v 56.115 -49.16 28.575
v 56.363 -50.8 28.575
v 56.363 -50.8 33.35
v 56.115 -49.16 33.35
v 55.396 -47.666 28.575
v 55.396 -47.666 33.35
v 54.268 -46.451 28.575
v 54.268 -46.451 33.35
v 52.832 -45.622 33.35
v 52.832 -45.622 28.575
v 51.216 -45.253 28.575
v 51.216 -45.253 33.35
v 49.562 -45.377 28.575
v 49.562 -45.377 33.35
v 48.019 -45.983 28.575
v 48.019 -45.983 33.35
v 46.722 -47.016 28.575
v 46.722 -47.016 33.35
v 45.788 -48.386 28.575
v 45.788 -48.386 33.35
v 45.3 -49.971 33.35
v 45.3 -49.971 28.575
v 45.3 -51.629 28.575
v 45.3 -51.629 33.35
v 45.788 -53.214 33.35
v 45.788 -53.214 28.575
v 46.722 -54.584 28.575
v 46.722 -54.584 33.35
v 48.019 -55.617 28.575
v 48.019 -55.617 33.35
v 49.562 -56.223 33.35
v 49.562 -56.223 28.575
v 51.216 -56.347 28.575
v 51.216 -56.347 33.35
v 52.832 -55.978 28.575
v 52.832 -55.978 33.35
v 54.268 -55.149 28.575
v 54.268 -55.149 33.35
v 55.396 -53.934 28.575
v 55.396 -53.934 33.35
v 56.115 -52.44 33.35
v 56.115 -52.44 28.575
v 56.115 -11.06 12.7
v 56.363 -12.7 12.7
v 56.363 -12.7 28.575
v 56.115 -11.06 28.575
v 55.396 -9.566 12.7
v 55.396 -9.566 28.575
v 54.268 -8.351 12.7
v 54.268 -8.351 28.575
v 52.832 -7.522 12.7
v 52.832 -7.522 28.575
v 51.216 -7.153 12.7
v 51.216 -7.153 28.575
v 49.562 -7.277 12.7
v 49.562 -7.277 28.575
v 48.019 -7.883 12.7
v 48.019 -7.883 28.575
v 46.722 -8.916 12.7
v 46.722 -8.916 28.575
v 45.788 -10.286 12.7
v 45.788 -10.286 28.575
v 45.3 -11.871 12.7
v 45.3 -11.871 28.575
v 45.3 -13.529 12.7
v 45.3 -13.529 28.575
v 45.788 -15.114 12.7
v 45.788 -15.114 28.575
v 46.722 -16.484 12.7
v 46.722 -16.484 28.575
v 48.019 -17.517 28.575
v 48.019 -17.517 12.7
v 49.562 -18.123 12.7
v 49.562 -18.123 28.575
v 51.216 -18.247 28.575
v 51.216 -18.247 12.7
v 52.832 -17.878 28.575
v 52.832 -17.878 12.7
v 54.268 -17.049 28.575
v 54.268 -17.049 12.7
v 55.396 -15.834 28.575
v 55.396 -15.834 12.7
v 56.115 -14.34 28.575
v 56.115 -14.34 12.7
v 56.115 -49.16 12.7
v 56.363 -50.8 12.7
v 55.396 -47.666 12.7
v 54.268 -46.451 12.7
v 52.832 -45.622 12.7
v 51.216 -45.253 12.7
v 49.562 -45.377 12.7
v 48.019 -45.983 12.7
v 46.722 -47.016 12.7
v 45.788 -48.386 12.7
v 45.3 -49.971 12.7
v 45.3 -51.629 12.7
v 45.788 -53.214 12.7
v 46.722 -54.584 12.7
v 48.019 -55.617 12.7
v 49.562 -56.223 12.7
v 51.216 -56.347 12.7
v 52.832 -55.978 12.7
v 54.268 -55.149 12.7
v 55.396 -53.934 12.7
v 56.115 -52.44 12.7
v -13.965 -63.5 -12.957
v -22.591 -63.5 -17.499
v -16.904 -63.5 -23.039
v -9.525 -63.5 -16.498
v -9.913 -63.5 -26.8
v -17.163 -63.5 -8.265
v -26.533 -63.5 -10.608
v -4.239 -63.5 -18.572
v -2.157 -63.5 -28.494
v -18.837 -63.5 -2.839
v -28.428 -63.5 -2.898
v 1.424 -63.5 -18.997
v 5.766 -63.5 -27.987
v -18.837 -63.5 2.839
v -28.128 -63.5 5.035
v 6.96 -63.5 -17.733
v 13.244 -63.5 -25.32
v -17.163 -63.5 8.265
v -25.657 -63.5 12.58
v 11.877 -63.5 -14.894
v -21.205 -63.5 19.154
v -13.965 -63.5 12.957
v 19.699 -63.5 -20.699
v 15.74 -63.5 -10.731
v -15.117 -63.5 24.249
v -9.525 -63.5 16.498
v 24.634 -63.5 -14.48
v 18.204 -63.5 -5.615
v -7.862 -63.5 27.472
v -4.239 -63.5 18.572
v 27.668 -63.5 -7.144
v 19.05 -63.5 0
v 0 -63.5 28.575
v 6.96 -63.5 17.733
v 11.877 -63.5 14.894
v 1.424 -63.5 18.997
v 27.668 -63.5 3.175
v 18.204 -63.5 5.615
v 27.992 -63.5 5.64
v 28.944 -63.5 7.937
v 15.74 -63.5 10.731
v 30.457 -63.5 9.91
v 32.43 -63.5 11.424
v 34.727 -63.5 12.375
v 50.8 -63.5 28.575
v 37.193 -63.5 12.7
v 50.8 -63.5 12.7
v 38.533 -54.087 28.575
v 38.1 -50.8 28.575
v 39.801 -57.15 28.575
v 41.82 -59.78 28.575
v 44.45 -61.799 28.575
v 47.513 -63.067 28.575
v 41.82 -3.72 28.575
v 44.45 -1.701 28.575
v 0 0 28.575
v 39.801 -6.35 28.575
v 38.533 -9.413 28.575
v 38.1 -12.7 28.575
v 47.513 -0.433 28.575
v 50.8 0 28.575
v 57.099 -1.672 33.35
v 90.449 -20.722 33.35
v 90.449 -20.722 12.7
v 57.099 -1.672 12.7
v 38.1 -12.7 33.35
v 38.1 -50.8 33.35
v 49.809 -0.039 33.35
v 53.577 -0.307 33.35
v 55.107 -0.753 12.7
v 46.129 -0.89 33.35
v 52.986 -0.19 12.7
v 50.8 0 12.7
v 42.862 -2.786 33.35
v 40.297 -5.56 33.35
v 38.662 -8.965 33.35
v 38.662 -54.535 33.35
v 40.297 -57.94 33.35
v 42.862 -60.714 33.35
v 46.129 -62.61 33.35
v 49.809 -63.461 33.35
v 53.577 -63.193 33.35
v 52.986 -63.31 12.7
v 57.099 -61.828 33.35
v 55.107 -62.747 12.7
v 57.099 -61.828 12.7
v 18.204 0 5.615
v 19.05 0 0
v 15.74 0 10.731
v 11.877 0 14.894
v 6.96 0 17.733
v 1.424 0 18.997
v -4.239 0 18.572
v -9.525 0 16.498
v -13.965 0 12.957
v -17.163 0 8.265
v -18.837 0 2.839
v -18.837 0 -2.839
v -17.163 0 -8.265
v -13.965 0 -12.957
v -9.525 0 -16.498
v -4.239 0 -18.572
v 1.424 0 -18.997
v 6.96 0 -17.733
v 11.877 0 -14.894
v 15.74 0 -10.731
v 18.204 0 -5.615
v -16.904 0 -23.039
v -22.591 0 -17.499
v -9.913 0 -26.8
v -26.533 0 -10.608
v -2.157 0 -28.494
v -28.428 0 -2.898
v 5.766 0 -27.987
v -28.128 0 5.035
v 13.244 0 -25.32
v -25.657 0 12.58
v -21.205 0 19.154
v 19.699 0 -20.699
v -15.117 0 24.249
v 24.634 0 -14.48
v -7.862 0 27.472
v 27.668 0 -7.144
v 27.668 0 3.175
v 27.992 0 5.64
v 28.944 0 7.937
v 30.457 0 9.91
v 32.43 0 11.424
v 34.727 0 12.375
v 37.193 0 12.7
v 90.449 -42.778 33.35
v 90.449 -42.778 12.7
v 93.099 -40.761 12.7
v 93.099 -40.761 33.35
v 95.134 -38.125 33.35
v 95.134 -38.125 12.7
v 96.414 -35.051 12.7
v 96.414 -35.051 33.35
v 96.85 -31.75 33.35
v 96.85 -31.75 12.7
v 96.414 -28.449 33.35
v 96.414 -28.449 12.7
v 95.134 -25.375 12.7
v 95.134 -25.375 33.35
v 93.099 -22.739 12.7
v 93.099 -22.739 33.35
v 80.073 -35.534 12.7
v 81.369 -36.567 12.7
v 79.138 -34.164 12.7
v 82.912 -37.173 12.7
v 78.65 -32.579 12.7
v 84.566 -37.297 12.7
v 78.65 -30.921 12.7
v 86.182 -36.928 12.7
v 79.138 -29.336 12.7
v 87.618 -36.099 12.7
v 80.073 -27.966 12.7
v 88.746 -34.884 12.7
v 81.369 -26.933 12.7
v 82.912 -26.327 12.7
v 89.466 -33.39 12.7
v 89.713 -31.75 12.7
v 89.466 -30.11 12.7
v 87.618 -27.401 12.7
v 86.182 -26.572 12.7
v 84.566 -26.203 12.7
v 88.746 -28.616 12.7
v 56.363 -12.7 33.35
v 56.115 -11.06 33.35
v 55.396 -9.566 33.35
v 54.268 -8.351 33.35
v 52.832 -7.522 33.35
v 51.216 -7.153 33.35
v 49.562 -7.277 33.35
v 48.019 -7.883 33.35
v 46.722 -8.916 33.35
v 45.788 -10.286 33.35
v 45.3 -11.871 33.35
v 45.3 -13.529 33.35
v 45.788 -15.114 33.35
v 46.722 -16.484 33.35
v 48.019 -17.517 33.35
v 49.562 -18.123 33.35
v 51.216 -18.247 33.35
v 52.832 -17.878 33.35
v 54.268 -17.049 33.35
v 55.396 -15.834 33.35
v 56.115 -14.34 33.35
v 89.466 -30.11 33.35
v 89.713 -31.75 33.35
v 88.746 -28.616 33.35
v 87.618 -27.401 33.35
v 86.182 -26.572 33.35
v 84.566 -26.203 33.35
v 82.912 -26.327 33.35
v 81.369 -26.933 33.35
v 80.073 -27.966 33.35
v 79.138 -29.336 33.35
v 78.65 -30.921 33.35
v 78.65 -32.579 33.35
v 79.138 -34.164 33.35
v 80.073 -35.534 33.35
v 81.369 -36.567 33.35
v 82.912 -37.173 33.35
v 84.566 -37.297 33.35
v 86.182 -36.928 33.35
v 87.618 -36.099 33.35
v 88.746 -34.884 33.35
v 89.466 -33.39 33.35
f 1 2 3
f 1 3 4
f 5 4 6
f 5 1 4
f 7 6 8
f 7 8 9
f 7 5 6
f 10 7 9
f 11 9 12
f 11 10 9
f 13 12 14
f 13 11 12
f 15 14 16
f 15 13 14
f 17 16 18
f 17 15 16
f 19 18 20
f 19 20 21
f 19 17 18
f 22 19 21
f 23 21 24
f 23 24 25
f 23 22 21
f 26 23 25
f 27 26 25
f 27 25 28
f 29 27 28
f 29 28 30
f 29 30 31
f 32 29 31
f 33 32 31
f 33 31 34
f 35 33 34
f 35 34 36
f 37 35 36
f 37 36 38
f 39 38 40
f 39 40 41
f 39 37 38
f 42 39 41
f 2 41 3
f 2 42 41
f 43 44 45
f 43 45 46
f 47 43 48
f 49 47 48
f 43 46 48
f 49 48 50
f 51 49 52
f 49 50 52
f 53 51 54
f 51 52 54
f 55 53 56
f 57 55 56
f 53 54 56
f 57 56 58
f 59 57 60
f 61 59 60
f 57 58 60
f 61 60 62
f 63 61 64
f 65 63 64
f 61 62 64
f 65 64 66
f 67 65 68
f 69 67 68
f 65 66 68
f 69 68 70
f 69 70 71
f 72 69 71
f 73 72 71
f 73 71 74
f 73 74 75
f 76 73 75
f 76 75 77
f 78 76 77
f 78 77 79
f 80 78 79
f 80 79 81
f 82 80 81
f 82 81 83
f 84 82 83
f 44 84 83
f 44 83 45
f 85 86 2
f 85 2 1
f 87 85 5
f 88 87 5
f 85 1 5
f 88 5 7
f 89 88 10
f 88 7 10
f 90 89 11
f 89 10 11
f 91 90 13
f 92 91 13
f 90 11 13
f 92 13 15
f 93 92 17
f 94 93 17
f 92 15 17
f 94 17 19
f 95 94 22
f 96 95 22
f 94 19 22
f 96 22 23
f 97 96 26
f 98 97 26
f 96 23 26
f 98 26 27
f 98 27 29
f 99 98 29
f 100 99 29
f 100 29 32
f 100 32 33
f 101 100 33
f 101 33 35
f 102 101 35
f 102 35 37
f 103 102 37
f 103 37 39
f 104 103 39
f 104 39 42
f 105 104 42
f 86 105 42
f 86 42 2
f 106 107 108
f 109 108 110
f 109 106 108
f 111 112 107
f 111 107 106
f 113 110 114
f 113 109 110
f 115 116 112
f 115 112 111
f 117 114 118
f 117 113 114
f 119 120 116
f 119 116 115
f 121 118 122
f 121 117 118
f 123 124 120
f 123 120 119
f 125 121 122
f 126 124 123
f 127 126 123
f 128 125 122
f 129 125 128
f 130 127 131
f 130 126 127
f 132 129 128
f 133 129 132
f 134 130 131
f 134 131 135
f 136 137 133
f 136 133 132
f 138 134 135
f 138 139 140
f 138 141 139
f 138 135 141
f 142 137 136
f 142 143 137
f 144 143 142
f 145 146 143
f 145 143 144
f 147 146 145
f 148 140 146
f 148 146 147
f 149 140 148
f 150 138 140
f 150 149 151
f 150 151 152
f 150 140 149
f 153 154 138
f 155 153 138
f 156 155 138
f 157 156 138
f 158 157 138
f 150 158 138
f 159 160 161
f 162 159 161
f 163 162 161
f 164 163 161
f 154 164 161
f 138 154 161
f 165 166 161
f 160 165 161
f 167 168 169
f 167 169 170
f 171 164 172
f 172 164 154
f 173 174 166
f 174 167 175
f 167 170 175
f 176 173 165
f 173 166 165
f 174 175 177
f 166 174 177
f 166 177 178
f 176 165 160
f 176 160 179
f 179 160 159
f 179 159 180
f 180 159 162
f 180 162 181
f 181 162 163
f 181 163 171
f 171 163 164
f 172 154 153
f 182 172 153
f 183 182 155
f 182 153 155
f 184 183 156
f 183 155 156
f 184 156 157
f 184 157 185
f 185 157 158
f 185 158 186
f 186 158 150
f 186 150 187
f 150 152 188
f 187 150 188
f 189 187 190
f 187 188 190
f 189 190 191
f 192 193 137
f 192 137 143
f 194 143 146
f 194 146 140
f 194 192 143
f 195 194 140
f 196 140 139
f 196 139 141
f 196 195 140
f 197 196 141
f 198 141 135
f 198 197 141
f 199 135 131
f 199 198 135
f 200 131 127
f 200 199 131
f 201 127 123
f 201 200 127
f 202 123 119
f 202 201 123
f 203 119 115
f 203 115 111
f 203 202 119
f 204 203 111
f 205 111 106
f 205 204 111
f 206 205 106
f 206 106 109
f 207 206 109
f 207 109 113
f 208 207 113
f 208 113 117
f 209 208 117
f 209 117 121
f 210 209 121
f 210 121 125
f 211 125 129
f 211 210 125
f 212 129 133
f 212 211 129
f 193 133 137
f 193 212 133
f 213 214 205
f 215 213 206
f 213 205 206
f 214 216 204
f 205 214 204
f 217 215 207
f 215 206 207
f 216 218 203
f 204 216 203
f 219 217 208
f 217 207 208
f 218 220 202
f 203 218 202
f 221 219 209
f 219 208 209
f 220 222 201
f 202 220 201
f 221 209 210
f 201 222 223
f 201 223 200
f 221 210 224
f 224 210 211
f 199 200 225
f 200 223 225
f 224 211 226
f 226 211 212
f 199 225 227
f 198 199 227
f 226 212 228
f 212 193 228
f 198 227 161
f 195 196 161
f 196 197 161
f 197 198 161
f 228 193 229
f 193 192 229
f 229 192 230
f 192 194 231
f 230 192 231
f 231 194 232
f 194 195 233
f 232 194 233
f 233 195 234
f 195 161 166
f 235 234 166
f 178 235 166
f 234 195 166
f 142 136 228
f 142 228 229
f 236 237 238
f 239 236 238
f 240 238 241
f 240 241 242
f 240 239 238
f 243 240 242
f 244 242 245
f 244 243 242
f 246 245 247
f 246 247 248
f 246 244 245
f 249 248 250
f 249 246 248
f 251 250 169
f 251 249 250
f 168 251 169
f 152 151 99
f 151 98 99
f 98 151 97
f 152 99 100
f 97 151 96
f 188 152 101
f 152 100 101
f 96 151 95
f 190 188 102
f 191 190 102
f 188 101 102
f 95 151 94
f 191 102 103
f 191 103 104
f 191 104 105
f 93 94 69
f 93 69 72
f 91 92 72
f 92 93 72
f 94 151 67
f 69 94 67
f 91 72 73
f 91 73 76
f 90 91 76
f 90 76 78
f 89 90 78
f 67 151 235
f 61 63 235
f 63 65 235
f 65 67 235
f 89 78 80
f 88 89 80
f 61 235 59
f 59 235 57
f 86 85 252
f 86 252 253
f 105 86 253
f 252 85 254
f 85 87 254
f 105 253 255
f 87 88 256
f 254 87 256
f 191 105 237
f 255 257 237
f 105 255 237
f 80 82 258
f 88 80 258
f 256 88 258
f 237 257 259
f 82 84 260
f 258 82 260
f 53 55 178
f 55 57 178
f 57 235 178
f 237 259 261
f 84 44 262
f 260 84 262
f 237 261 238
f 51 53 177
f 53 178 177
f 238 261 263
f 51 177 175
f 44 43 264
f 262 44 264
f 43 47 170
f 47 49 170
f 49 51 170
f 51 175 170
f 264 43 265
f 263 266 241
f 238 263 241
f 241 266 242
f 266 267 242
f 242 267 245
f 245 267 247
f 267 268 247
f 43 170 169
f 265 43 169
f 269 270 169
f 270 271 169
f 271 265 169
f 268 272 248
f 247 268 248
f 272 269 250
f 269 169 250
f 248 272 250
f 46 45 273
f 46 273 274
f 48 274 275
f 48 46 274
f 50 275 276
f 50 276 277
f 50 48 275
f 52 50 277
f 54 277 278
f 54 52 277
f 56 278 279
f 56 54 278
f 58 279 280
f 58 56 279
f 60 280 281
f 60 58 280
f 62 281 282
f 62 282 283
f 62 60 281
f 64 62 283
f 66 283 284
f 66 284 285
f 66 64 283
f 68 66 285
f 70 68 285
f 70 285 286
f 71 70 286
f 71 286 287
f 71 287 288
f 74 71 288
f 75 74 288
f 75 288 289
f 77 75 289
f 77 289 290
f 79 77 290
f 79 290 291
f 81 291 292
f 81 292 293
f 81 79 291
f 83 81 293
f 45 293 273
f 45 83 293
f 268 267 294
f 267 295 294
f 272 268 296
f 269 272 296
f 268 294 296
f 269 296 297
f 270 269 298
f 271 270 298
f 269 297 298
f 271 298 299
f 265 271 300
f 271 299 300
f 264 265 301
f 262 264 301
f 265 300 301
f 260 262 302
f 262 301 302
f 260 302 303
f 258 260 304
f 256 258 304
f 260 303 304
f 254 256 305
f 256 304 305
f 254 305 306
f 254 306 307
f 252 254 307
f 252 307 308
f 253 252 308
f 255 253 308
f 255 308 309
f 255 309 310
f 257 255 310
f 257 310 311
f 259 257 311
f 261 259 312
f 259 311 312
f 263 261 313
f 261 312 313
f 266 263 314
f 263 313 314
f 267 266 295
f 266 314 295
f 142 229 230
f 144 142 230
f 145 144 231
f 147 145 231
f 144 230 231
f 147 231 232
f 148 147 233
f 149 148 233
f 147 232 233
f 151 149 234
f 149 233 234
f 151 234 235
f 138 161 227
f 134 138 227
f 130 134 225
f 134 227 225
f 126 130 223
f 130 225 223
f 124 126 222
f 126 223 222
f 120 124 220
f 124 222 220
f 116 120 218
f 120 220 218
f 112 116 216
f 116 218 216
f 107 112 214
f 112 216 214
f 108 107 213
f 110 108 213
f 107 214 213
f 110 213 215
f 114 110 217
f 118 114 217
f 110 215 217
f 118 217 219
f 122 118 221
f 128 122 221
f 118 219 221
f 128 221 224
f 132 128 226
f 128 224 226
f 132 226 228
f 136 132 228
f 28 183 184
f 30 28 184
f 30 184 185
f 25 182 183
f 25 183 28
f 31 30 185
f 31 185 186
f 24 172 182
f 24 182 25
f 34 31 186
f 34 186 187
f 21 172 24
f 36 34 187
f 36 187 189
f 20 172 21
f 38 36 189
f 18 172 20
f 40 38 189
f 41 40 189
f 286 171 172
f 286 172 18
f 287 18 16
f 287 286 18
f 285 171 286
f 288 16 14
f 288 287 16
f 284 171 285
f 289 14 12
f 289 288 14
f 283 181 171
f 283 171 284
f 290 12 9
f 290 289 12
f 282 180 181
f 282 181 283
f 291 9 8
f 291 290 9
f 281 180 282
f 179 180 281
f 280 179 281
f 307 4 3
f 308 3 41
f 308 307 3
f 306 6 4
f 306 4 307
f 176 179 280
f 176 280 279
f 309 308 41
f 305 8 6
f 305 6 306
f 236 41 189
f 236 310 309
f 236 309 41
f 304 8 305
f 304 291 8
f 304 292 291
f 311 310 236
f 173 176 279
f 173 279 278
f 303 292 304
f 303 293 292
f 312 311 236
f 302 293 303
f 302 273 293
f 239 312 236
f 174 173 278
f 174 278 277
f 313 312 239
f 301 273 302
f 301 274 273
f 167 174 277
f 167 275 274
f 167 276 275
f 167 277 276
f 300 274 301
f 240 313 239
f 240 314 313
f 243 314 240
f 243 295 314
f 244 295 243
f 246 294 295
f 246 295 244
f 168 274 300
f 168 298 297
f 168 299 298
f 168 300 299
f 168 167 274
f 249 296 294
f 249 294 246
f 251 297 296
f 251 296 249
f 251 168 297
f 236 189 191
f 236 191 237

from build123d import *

# Parameters (mm, degrees)
F0_R     = 19.05
F1_DEPTH = 63.5
F2_R     = 5.5626
F3_DEPTH = 4.7752
F4_DEPTH = 4.7752
F5_DEPTH = 15.875
F6_DEPTH = 20.6502
F7_R     = 5.5626
F8_DEPTH = 20.6502
F9_DEPTH = 15.875


with BuildPart() as f1:
    # F0 (on Front) → F1 (new body)
    with BuildSketch(Plane.XZ):
        with BuildLine():
            Line((69.85, 28.575), (0, 28.575))
            ThreePointArc((0, 28.575), (-22.5905210348, -17.49854235), (27.6676247795, -7.14375))
            Line((27.6676247795, -7.14375), (27.6676247795, 3.175))
            ThreePointArc((27.6676247795, 3.175), (30.4574326887, 9.9101920908), (37.1926247795, 12.7))
            Line((37.1926247795, 12.7), (69.85, 12.7))
            Line((69.85, 12.7), (69.85, 28.575))
        make_face()
        Circle(F0_R, mode=Mode.SUBTRACT)
    extrude(amount=F1_DEPTH)

    # F2 (on face) → F3 (join)
    with BuildSketch(Plane.XY.offset(28.575)):
        with BuildLine():
            Line((90.4493554441, -20.7222785358), (57.0991554441, -1.6722785358))
            ThreePointArc((57.0991554441, -1.6722785358), (44.4246284085, -1.7161647377), (38.1, -12.7))
            Line((38.1, -12.7), (38.1, -50.8))
            ThreePointArc((38.1, -50.8), (44.4246284085, -61.7838352623), (57.0991554441, -61.8277214642))
            Line((57.0991554441, -61.8277214642), (90.4493554441, -42.7777214642))
            ThreePointArc((90.4493554441, -42.7777214642), (96.8502, -31.75), (90.4493554441, -20.7222785358))
        make_face()
        with Locations((50.8, -50.8)):
            Circle(F2_R, mode=Mode.SUBTRACT)
        with Locations((50.8, -12.7)):
            Circle(F2_R, mode=Mode.SUBTRACT)
        with Locations((84.1502, -31.75)):
            Circle(F2_R, mode=Mode.SUBTRACT)
        with Locations((84.1502, -31.75)):
            Circle(F2_R)
    extrude(amount=F3_DEPTH)

    # F2 (on face) → F4 (join)
    with BuildSketch(Plane.XY.offset(28.575)):
        with BuildLine():
            Line((90.4493554441, -20.7222785358), (57.0991554441, -1.6722785358))
            ThreePointArc((57.0991554441, -1.6722785358), (44.4246284085, -1.7161647377), (38.1, -12.7))
            Line((38.1, -12.7), (38.1, -50.8))
            ThreePointArc((38.1, -50.8), (44.4246284085, -61.7838352623), (57.0991554441, -61.8277214642))
            Line((57.0991554441, -61.8277214642), (90.4493554441, -42.7777214642))
            ThreePointArc((90.4493554441, -42.7777214642), (96.8502, -31.75), (90.4493554441, -20.7222785358))
        make_face()
        with Locations((50.8, -50.8)):
            Circle(F2_R, mode=Mode.SUBTRACT)
        with Locations((50.8, -12.7)):
            Circle(F2_R, mode=Mode.SUBTRACT)
        with Locations((84.1502, -31.75)):
            Circle(F2_R, mode=Mode.SUBTRACT)
    extrude(amount=F4_DEPTH)

    # F5 (cut, through all): faces of the model
    f5_faces = [f1.faces().sort_by_distance(p)[0] for p in [
        (64.480850076, -2.9493294549, 28.575),
        (64.480850076, -60.5506705451, 28.575),
    ]]
    extrude(f5_faces, amount=-F5_DEPTH, mode=Mode.SUBTRACT)

    # F6 (cut): faces of the model
    f6_faces = [f1.faces().sort_by_distance(p)[0] for p in [
        (50.8, -12.7, 28.575),
        (50.8, -50.8, 28.575),
    ]]
    extrude(f6_faces, amount=-F6_DEPTH, mode=Mode.SUBTRACT)

    # F7 (on face) → F8 (cut)
    with BuildSketch(Plane.XY.offset(33.3502)):
        with Locations((84.1502, -31.75)):
            Circle(F7_R)
    extrude(amount=-F8_DEPTH, mode=Mode.SUBTRACT)

    # F9 (add, through all): a face of the model
    f9_faces = [f1.faces().sort_by_distance(p)[0] for p in [
        (96.3203574662, -31.75, 28.575),
    ]]
    extrude(f9_faces, amount=F9_DEPTH)


solid = f1.part
